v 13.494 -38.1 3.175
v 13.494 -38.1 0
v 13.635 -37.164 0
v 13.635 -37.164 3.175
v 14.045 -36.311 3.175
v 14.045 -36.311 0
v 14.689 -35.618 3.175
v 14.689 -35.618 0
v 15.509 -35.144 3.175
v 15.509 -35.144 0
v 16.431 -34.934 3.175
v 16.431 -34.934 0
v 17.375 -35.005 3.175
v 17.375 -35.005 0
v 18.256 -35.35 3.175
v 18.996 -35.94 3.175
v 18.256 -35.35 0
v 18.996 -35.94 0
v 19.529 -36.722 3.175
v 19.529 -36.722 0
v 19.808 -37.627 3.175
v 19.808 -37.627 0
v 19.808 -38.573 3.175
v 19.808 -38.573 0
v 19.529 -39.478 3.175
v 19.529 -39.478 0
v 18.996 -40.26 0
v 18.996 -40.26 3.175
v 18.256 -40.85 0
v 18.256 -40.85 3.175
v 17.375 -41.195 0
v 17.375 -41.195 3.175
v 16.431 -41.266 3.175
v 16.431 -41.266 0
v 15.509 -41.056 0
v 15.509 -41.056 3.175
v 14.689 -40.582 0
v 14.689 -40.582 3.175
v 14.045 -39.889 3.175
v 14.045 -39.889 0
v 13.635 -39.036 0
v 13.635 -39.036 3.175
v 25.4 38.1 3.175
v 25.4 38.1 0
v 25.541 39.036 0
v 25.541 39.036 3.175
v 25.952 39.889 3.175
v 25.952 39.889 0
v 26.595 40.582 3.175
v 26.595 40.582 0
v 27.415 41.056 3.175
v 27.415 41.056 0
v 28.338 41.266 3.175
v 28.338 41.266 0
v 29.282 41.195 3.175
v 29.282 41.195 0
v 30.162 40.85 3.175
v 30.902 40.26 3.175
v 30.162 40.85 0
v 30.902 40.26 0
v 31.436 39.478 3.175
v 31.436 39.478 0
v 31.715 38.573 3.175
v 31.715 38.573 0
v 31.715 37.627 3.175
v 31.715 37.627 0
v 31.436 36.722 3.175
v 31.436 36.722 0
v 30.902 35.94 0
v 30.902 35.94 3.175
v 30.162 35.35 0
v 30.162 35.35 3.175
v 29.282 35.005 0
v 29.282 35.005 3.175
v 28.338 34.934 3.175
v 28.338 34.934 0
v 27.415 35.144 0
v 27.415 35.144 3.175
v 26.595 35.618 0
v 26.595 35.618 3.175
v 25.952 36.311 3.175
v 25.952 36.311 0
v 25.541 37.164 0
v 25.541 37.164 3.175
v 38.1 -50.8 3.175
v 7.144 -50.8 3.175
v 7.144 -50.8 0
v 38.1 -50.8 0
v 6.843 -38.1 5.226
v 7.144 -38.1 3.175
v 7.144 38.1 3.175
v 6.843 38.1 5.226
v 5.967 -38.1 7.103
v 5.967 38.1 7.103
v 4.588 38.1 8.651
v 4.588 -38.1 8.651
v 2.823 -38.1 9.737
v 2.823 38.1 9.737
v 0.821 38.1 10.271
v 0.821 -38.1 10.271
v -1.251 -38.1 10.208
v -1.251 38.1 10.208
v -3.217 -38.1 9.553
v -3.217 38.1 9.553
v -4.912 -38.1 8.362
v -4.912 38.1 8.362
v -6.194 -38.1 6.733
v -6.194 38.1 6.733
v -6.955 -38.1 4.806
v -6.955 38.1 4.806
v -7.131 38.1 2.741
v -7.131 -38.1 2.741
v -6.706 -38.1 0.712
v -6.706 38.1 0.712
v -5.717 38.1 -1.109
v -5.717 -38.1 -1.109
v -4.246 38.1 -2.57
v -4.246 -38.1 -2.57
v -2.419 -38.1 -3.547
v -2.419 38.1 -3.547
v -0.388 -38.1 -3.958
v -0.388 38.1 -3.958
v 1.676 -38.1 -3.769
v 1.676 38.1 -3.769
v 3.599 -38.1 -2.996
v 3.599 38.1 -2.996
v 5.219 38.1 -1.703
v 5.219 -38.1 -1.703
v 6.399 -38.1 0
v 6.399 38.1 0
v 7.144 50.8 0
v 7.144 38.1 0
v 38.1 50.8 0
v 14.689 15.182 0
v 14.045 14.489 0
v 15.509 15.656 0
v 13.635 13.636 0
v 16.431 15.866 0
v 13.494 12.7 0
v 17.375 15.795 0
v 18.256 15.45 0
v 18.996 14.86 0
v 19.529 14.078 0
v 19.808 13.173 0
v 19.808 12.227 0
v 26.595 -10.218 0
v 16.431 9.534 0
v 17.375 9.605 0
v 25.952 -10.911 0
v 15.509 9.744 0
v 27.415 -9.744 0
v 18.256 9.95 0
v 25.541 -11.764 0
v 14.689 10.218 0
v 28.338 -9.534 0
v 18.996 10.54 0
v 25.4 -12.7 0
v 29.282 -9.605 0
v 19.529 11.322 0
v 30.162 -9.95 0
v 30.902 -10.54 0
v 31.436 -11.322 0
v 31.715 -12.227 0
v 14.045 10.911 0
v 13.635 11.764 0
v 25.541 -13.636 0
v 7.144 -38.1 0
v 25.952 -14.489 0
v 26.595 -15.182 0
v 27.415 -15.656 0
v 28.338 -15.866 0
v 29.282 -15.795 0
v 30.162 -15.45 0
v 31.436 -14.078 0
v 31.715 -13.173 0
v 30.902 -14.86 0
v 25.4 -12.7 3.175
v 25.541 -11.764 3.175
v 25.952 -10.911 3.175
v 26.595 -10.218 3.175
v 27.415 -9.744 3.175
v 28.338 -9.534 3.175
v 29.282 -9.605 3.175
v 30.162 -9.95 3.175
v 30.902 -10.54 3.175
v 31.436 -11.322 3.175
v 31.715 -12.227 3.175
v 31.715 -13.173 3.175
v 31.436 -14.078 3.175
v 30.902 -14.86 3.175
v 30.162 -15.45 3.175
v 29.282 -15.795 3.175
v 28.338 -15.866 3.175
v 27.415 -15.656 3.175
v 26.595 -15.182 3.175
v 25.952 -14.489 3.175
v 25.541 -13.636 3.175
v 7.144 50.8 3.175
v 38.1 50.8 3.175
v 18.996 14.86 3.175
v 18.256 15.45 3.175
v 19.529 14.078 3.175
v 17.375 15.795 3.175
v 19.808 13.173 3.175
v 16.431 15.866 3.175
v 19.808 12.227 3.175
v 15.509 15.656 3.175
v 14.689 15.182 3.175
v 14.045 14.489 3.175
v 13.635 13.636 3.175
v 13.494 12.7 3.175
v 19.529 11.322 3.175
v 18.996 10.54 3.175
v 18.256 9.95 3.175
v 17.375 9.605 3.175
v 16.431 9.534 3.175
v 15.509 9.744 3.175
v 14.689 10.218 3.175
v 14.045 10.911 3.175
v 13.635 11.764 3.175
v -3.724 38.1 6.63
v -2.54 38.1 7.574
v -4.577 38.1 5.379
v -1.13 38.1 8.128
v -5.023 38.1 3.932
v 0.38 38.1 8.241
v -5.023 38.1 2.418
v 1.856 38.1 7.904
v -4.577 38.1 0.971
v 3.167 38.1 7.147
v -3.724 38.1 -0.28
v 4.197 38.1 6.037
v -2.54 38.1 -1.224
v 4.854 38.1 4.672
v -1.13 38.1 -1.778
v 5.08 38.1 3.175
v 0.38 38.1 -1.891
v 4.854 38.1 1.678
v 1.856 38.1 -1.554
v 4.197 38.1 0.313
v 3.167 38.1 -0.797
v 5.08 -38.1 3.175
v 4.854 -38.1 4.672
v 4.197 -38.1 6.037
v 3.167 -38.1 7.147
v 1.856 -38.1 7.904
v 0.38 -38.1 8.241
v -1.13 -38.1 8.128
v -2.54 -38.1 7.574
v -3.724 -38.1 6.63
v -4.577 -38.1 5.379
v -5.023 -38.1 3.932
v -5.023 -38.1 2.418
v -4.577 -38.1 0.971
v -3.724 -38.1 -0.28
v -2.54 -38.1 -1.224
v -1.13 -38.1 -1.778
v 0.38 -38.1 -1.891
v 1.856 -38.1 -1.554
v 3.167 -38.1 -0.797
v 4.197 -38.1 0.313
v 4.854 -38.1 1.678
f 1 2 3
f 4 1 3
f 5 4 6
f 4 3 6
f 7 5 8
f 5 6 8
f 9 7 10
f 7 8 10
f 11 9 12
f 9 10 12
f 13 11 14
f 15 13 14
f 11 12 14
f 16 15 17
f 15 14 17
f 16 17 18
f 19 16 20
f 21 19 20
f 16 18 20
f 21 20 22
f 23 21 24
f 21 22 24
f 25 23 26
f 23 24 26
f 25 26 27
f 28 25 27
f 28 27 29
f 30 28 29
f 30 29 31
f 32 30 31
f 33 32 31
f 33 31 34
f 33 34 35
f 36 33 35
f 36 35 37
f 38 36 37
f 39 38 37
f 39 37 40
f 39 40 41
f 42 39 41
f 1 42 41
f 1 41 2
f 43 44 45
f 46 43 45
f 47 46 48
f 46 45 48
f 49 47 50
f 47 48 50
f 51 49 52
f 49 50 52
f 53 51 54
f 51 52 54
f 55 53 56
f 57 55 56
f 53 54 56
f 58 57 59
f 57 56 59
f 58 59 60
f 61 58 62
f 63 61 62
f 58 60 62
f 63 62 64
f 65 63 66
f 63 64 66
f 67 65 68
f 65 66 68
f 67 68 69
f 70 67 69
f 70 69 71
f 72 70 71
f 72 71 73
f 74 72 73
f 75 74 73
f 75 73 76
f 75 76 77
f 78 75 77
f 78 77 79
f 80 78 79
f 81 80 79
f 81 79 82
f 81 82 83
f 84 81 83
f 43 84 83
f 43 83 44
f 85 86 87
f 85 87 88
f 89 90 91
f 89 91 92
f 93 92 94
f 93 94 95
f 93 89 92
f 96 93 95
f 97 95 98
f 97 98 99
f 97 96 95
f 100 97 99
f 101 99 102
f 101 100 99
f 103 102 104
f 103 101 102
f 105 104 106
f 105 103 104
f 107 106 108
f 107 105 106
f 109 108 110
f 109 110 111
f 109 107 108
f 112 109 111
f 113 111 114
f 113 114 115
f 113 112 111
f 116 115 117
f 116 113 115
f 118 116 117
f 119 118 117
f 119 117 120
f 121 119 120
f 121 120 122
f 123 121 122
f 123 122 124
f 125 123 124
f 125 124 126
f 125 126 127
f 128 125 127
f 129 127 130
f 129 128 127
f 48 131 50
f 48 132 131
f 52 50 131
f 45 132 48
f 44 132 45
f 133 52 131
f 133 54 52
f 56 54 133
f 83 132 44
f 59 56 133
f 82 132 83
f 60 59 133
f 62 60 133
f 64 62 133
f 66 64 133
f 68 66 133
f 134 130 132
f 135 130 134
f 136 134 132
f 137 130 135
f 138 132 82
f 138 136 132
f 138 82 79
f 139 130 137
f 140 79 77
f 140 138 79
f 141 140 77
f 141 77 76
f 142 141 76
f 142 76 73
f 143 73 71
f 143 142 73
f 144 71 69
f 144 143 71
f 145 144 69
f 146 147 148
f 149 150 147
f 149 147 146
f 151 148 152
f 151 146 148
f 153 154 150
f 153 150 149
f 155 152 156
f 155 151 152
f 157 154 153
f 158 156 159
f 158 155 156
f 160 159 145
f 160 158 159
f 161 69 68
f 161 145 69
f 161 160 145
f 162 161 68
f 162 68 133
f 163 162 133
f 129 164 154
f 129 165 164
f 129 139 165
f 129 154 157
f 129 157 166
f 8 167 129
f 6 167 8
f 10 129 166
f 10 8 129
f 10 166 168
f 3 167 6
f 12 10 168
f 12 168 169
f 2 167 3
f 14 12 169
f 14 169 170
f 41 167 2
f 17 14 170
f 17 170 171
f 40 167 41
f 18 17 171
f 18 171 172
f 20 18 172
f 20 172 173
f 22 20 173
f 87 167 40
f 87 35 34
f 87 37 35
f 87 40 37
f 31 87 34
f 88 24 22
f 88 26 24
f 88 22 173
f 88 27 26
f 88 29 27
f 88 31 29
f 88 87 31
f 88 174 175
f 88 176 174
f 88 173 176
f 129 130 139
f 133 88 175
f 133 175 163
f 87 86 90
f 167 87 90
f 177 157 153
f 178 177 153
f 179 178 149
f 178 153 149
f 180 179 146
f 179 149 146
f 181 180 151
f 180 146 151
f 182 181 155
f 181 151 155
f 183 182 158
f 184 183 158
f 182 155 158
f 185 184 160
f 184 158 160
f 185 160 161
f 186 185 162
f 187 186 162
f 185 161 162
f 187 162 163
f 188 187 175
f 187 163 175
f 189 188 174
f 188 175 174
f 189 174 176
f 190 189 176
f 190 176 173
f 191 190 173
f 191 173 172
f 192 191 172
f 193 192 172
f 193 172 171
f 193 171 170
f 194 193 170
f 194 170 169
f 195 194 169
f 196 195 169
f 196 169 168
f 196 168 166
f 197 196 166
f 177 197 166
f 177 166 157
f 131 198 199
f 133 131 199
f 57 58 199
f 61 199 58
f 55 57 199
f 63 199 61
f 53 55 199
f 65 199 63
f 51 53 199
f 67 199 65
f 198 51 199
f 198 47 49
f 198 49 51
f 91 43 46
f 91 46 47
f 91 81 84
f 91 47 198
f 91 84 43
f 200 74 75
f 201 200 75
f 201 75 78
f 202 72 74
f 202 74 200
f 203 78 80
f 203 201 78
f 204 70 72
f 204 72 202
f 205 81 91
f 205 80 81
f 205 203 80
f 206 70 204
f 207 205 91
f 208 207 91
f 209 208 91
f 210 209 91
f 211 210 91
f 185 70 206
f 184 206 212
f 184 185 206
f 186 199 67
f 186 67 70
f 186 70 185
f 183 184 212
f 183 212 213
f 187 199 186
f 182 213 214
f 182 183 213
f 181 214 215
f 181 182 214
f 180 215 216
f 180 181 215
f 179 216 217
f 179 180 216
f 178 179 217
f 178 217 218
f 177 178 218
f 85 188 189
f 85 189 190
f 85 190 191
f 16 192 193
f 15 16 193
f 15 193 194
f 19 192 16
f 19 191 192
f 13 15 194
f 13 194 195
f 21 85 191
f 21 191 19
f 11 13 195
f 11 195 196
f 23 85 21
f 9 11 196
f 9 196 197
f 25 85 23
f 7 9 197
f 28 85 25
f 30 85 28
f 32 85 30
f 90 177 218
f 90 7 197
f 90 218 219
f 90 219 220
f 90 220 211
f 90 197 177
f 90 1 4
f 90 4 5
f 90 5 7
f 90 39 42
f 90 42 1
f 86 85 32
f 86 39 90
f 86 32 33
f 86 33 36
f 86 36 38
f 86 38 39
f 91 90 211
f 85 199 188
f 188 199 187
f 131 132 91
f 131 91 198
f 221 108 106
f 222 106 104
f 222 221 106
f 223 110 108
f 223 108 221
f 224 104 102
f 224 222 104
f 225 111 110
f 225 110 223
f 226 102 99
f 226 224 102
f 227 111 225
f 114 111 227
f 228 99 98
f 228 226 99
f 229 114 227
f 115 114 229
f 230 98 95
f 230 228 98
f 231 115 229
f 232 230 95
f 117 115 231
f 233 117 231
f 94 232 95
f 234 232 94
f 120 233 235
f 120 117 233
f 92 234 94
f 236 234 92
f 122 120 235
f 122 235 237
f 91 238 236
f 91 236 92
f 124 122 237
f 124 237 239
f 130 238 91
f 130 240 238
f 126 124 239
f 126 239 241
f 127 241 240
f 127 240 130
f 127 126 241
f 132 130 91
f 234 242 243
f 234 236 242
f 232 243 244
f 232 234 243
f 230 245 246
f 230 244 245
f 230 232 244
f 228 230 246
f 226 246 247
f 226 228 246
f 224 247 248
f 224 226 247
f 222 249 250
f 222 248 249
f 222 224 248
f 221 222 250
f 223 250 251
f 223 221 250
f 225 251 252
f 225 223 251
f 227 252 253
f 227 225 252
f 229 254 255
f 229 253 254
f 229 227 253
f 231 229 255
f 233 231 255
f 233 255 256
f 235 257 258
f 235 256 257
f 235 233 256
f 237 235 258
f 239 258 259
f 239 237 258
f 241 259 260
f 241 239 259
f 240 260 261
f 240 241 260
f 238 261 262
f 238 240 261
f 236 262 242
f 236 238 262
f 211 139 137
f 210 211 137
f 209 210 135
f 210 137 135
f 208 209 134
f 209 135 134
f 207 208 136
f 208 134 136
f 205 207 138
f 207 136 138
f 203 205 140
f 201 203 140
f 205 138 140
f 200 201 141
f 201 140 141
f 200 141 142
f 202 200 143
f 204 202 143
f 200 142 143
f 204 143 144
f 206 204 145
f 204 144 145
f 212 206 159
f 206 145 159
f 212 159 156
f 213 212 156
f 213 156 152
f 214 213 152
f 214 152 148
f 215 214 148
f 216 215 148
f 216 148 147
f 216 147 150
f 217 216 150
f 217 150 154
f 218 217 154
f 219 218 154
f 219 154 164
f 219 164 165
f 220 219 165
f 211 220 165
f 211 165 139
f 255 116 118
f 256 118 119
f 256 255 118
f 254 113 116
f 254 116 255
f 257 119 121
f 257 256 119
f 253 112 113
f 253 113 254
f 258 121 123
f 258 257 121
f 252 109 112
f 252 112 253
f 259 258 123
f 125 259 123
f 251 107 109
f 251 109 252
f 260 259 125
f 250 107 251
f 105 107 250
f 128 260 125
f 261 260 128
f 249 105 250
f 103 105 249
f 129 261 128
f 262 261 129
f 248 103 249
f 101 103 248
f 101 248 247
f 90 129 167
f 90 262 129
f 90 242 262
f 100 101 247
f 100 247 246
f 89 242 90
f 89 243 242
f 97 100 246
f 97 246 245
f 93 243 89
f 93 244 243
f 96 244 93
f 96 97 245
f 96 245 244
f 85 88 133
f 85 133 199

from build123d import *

# Parameters (mm, degrees)
F0_R     = 5.08
F1_DEPTH = 50.8
F2_W     = 14.402608
F2_H     = 12.7
F2_H_2   = 12.700002
F3_DEPTH = 12.7
F5_D     = 6.35


with BuildPart() as f1:
    # F0 (on Front) → F1 (new body, symmetric)
    with BuildSketch(Plane.XZ):
        with BuildLine():
            ThreePointArc((6.399417, 0), (6.955178, 1.544459), (7.14375, 3.175))
            ThreePointArc((7.14375, 3.175), (-6.955178, 4.805541), (6.399417, 0))
        make_face()
        with Locations((0, 3.175)):
            Circle(F0_R, mode=Mode.SUBTRACT)
        with BuildLine():
            Line((38.1, 3.175), (7.14375, 3.175))
            ThreePointArc((7.14375, 3.175), (6.955178, 1.544459), (6.399417, 0))
            Line((6.399417, 0), (38.1, 0))
            Line((38.1, 0), (38.1, 3.175))
        make_face()
    extrude(amount=F1_DEPTH, both=True)

    # F2 (on Top) → F3 (cut, symmetric)
    with BuildSketch(Plane.XY):
        with Locations((-0.057554, 44.45)):
            Rectangle(F2_W, F2_H)
        with Locations((-0.057554, -44.449999)):
            Rectangle(F2_W, F2_H_2)
    extrude(amount=F3_DEPTH, both=True, mode=Mode.SUBTRACT)

    # F5 (through all)
    with Locations(Plane.XY.offset(3.175)):
        with Locations((28.575, 38.1), (16.66875, 12.7), (28.575, -12.7), (16.66875, -38.1)):
            Hole(F5_D / 2)


solid = f1.part
